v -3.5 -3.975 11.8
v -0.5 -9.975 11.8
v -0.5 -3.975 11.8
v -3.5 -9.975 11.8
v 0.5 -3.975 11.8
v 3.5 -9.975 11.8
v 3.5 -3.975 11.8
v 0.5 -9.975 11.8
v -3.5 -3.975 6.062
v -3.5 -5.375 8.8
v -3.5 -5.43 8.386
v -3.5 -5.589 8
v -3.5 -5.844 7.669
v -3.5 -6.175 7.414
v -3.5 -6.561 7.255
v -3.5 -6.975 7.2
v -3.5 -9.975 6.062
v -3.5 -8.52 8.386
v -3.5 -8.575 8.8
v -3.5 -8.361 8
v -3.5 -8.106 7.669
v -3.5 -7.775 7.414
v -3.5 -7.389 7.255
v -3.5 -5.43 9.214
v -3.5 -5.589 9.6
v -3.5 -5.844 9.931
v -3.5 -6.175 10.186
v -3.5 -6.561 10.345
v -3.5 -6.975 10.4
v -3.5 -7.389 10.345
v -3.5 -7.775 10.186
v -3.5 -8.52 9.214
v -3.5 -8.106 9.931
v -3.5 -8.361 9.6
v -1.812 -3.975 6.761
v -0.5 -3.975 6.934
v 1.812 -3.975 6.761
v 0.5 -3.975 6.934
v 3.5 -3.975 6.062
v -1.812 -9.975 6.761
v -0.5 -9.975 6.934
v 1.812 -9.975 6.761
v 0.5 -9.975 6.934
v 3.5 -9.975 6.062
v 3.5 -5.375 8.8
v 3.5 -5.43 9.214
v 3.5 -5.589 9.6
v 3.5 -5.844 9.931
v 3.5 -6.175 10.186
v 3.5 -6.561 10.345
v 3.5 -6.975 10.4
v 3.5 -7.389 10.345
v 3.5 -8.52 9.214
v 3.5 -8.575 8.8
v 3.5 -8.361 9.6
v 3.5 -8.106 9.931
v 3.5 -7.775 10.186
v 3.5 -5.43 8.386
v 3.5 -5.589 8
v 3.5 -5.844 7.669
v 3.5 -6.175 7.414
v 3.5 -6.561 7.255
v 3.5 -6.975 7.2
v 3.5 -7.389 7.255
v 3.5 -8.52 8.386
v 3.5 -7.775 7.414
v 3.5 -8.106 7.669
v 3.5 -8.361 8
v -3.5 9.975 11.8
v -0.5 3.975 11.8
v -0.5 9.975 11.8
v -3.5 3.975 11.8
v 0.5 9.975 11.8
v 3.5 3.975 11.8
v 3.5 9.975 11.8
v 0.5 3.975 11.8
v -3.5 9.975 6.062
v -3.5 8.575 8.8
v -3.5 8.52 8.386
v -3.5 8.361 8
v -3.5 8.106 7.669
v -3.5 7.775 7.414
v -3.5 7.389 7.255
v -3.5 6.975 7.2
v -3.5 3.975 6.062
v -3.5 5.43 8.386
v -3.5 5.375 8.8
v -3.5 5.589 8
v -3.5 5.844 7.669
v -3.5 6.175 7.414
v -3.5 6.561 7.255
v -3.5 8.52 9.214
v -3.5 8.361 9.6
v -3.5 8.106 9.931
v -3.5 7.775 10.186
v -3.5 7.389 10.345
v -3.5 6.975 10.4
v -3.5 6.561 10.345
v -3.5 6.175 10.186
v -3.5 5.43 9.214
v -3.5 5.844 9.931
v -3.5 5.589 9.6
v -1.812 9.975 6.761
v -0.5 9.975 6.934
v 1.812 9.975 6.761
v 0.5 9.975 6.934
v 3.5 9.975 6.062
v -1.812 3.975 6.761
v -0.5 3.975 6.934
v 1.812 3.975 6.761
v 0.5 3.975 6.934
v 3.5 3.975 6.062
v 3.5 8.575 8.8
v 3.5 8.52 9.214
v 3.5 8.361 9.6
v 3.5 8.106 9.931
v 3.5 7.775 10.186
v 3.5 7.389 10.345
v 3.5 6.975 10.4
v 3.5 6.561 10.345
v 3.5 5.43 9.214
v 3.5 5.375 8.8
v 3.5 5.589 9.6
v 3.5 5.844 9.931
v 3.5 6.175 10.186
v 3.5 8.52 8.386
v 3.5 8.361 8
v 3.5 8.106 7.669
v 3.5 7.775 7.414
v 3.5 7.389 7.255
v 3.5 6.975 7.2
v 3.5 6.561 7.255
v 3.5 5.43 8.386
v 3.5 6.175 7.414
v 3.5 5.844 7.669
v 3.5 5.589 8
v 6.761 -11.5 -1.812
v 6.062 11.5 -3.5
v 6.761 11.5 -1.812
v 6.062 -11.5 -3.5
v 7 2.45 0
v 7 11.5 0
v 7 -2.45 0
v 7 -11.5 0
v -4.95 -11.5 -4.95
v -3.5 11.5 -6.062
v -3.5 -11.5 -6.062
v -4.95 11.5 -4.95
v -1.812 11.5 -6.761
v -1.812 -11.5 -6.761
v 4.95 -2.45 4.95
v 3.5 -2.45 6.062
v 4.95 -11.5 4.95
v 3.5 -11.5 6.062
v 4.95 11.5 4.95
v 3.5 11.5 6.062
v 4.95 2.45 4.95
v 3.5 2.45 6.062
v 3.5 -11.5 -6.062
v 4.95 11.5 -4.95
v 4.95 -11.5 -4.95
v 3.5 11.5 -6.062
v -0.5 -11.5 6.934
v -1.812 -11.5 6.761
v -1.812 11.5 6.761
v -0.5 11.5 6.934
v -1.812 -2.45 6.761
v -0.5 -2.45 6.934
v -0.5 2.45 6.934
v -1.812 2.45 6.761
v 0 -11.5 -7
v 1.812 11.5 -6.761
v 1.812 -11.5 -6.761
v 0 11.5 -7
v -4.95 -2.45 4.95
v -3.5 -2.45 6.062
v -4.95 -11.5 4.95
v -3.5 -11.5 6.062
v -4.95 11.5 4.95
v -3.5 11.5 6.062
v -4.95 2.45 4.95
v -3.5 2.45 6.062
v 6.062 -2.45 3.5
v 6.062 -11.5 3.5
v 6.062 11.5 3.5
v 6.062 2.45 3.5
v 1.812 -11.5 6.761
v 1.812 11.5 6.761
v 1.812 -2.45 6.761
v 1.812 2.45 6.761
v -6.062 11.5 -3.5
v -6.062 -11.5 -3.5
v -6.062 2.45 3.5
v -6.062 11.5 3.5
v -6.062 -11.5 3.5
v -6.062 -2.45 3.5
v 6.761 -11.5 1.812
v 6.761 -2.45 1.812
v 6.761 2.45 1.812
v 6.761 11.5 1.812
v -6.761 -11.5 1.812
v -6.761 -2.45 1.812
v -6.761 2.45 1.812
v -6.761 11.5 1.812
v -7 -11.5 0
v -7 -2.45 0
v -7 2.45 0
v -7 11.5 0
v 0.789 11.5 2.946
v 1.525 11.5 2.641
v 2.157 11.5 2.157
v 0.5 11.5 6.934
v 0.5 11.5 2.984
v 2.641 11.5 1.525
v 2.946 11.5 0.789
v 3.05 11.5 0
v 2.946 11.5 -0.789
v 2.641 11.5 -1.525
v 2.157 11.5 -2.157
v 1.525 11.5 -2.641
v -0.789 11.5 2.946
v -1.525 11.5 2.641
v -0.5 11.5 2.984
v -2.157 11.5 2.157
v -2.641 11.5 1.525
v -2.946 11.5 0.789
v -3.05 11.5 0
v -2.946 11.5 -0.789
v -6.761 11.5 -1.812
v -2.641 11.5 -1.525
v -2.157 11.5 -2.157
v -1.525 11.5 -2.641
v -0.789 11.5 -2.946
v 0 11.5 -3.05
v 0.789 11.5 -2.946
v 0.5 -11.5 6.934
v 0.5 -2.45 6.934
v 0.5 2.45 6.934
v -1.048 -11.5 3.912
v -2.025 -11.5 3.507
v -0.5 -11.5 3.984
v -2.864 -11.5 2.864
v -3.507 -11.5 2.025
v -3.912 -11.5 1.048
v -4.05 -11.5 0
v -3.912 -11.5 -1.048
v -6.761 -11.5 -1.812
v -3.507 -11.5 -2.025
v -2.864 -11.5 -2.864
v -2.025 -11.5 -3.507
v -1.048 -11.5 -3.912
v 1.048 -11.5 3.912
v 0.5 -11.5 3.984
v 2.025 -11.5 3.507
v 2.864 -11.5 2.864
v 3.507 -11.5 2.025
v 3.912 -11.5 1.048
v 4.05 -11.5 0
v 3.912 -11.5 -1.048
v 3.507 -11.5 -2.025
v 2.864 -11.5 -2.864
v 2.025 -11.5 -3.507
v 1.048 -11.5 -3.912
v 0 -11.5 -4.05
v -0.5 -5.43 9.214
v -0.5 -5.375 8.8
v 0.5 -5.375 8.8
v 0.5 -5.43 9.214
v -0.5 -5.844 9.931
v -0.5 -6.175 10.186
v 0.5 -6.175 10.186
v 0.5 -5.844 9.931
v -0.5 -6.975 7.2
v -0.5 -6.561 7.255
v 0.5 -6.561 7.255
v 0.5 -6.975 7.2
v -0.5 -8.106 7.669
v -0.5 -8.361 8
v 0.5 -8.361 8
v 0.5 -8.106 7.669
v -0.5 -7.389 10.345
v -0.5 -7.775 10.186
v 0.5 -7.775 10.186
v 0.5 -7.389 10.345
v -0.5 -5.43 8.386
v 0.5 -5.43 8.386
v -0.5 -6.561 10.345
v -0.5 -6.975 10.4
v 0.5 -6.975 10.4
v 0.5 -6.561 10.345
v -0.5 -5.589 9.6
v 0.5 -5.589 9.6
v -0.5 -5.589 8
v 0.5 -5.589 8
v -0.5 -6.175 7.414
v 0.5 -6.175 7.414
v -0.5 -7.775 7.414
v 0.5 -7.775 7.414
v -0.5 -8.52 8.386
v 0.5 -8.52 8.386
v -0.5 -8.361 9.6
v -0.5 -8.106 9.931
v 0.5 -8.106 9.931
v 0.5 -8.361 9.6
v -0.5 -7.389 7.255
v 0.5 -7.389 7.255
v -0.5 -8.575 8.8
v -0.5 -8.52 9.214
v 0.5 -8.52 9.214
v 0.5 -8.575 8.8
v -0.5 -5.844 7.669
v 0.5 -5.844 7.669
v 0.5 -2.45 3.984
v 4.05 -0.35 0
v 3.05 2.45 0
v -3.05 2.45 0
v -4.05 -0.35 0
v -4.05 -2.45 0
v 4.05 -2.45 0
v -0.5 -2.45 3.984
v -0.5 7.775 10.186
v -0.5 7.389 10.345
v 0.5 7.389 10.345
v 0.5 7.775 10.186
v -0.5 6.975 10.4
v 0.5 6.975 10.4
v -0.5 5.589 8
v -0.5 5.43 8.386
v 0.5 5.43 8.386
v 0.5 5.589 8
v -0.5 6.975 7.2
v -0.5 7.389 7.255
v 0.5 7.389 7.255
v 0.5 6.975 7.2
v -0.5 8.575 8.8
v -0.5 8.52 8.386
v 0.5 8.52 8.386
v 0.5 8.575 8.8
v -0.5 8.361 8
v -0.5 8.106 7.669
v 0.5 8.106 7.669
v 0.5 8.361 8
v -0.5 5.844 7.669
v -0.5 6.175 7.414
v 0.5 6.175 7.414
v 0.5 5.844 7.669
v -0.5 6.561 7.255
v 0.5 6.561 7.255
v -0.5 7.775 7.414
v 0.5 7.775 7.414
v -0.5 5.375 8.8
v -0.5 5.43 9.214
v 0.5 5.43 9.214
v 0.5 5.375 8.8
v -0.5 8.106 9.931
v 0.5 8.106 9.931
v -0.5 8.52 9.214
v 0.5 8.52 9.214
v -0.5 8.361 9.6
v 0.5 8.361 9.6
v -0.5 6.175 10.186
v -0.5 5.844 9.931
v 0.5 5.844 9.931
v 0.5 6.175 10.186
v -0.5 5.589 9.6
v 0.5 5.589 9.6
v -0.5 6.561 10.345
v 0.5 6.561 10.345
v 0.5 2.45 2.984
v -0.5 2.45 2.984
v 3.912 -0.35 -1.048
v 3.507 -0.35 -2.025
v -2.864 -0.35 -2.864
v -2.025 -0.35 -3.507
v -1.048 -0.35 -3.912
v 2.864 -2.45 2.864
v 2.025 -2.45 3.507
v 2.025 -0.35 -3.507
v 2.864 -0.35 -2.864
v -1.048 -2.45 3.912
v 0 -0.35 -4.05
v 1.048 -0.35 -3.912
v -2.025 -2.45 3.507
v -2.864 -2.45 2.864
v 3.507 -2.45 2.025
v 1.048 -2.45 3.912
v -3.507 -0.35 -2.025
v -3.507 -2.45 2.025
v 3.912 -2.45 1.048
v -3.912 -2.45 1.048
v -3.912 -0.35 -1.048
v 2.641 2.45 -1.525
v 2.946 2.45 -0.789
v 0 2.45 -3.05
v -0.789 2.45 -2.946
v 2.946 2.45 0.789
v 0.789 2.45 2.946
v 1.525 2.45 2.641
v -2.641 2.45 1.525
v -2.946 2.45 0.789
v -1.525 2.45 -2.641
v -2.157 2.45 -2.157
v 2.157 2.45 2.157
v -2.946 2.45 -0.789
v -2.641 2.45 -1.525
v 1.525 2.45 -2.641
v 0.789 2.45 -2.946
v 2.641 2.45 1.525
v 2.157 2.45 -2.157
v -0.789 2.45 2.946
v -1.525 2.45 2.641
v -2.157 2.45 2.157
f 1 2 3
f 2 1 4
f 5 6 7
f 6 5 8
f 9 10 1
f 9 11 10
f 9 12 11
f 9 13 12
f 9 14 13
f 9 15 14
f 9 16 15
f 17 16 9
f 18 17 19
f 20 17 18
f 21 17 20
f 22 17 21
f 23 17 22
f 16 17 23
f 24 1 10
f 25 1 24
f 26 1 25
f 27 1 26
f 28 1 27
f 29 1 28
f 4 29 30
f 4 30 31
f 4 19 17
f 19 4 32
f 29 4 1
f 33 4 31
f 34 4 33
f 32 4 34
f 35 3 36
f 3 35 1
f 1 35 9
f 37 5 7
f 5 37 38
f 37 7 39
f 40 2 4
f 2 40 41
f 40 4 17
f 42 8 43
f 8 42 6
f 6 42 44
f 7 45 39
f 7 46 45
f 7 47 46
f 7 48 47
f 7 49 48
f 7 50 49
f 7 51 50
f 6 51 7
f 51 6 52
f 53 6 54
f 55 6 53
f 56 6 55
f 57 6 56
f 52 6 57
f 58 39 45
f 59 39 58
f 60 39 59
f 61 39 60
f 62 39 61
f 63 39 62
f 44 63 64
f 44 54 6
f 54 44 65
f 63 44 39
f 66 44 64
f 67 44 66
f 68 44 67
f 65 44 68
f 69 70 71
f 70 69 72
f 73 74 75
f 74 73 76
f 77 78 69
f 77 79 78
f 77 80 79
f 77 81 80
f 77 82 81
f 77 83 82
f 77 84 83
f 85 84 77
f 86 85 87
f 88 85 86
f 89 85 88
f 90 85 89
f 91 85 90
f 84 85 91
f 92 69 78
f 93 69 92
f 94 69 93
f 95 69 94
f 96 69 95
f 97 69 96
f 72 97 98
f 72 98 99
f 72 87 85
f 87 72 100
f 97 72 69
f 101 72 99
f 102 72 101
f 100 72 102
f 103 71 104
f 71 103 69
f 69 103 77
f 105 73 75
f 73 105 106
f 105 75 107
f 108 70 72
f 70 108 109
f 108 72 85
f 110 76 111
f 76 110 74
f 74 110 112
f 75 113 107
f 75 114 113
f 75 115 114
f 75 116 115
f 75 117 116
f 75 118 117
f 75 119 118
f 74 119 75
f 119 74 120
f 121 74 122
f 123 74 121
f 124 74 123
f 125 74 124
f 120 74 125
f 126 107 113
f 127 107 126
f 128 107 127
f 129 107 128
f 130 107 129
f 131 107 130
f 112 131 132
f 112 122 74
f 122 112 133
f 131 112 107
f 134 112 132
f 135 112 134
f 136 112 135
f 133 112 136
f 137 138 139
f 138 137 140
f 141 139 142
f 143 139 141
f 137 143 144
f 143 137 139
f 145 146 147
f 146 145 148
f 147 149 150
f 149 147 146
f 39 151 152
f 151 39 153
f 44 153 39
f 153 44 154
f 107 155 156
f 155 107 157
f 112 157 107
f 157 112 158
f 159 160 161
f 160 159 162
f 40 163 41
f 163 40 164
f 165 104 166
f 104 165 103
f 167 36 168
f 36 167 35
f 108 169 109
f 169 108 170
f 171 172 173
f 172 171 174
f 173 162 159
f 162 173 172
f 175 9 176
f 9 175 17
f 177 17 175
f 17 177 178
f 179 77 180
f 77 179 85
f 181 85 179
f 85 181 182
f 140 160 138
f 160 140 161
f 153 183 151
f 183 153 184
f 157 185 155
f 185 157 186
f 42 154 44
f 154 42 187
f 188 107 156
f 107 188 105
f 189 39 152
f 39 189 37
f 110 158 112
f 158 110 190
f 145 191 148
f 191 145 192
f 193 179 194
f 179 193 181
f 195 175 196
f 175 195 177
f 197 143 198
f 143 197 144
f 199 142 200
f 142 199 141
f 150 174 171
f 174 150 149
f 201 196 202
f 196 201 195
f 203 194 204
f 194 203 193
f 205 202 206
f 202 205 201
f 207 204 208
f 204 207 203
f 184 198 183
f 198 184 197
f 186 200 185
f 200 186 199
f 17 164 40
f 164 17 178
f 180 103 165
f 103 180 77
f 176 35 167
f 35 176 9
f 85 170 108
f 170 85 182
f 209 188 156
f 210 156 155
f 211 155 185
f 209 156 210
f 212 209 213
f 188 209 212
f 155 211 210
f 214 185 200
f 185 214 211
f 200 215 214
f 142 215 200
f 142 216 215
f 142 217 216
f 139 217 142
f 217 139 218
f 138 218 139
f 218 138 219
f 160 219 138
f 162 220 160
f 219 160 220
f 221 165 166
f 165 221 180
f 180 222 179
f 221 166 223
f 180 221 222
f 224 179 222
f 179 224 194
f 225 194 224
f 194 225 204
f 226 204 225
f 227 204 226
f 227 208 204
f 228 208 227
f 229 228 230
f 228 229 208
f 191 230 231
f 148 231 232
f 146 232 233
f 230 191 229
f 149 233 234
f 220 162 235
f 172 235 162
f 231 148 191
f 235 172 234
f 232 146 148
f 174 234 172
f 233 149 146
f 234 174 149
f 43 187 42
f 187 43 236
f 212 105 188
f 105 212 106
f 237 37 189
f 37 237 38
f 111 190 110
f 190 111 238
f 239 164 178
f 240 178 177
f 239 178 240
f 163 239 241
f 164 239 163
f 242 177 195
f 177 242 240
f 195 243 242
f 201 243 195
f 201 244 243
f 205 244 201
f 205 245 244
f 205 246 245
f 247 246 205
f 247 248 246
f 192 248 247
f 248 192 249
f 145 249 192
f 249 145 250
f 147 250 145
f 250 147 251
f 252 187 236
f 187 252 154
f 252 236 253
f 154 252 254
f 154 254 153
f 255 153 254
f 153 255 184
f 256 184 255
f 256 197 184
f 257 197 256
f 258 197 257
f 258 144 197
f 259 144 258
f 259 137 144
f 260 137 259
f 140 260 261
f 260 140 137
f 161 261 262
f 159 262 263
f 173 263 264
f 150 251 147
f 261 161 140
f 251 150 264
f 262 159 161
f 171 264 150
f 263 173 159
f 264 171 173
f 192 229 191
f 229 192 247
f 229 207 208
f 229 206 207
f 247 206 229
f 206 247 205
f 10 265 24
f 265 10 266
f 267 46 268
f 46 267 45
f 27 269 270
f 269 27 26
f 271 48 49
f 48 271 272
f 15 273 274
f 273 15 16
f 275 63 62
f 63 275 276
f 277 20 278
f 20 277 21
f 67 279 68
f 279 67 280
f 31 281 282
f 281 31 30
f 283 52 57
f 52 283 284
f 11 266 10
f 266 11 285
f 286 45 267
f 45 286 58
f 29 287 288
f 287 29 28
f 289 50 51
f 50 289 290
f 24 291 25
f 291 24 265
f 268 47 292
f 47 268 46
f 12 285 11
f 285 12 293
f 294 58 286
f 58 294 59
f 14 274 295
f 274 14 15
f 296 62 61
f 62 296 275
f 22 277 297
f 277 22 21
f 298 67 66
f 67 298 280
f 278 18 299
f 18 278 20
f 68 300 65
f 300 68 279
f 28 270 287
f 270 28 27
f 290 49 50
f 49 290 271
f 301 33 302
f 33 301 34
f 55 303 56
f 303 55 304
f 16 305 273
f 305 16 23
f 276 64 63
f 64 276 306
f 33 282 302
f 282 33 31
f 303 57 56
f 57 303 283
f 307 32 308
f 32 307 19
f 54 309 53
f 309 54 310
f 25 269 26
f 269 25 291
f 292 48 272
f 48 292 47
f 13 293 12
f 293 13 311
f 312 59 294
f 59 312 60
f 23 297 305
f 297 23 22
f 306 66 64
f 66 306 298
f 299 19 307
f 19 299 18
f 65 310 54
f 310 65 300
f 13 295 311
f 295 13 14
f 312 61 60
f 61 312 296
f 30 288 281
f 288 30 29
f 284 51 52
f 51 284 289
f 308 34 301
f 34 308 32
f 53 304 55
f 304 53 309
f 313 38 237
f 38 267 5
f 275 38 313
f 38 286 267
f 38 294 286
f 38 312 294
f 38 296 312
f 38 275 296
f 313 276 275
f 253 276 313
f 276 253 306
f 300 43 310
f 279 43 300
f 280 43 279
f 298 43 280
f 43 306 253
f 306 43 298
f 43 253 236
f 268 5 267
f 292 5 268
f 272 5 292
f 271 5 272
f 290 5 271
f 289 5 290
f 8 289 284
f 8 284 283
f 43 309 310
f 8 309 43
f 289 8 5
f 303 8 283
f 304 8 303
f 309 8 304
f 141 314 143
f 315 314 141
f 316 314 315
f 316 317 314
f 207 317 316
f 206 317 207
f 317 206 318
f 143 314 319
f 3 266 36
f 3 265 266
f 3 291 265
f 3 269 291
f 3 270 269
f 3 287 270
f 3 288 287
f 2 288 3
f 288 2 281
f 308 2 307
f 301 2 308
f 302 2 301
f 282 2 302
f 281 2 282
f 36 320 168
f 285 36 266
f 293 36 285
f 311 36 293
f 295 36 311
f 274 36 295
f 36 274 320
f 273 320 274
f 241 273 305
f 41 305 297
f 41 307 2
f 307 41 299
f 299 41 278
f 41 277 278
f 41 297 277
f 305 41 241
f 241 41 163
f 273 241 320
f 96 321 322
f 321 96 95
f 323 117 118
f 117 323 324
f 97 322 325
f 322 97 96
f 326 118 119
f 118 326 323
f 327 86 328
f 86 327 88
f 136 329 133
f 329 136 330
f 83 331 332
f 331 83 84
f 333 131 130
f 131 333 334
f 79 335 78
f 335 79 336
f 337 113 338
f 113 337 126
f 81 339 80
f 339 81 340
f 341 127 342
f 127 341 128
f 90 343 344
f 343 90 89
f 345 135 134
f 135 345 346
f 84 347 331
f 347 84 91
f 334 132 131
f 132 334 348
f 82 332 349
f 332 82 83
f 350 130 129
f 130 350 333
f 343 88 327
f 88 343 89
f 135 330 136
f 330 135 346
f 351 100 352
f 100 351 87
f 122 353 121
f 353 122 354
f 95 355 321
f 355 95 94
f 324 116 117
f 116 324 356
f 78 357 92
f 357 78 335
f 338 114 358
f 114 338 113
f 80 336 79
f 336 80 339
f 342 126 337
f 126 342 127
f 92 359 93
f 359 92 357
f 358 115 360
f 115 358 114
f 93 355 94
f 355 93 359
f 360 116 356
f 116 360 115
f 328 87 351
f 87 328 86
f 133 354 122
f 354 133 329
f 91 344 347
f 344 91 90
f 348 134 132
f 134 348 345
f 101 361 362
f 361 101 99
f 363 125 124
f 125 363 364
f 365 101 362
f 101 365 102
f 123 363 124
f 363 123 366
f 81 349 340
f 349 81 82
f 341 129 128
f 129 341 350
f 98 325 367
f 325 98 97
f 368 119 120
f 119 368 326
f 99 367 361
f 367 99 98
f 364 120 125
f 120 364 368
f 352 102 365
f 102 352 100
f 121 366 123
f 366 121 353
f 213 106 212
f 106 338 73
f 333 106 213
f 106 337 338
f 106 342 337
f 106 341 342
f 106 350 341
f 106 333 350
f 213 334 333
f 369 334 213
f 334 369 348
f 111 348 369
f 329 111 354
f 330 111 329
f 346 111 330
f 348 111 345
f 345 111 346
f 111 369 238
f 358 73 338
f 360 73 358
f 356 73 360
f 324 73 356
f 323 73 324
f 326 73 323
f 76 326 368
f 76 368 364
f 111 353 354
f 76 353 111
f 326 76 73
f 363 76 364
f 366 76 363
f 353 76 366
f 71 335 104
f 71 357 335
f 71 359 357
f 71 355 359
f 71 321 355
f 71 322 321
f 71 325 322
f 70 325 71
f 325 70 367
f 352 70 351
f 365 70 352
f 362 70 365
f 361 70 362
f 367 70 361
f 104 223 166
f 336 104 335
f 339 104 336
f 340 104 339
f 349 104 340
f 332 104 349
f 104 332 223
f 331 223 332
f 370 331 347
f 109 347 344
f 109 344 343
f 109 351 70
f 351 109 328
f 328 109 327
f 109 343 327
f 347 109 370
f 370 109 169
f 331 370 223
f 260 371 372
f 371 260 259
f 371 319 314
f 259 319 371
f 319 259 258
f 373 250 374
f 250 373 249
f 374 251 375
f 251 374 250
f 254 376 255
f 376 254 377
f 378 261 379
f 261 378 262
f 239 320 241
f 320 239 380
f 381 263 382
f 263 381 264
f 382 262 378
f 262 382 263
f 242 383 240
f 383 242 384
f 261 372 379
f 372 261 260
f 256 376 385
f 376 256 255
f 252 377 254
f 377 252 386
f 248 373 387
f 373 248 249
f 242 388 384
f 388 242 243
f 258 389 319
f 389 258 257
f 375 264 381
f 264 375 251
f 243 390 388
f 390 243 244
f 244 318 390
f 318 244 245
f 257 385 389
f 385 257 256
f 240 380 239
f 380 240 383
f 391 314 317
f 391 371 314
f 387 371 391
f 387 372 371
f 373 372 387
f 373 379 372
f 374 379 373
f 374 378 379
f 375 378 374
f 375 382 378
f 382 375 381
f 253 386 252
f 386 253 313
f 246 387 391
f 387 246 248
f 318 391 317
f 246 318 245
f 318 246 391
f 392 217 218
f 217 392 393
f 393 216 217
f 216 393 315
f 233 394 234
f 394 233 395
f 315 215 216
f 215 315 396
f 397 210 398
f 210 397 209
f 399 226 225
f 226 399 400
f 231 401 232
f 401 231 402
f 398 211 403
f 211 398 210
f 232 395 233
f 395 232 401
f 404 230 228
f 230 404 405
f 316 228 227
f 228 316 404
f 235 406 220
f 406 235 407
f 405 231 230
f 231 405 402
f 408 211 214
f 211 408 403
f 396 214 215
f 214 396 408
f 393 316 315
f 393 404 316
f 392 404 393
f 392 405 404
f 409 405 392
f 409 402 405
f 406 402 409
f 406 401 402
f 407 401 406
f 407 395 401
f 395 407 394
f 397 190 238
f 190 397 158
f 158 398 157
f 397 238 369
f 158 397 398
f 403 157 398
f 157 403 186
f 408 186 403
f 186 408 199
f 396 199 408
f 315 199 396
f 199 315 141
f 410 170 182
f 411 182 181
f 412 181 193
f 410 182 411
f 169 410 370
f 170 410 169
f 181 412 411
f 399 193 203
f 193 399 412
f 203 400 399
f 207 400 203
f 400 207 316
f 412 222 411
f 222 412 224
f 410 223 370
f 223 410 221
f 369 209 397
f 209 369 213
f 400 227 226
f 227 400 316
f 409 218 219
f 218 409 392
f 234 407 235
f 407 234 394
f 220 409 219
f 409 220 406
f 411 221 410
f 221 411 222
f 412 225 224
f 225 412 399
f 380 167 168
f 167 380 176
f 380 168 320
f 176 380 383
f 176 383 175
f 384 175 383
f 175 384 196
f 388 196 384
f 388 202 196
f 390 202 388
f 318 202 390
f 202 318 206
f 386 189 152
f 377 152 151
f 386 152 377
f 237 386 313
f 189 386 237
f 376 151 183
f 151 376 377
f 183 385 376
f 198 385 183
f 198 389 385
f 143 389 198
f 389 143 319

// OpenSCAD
// Legacy wrapper kept so older bookmarks still open the current coupler.
// The design has been changed from an Oldham coupler to a solid sleeve coupler.

part_mode = "solid_coupler";
part_cutaway = false;

include <../frame_master.scad>
